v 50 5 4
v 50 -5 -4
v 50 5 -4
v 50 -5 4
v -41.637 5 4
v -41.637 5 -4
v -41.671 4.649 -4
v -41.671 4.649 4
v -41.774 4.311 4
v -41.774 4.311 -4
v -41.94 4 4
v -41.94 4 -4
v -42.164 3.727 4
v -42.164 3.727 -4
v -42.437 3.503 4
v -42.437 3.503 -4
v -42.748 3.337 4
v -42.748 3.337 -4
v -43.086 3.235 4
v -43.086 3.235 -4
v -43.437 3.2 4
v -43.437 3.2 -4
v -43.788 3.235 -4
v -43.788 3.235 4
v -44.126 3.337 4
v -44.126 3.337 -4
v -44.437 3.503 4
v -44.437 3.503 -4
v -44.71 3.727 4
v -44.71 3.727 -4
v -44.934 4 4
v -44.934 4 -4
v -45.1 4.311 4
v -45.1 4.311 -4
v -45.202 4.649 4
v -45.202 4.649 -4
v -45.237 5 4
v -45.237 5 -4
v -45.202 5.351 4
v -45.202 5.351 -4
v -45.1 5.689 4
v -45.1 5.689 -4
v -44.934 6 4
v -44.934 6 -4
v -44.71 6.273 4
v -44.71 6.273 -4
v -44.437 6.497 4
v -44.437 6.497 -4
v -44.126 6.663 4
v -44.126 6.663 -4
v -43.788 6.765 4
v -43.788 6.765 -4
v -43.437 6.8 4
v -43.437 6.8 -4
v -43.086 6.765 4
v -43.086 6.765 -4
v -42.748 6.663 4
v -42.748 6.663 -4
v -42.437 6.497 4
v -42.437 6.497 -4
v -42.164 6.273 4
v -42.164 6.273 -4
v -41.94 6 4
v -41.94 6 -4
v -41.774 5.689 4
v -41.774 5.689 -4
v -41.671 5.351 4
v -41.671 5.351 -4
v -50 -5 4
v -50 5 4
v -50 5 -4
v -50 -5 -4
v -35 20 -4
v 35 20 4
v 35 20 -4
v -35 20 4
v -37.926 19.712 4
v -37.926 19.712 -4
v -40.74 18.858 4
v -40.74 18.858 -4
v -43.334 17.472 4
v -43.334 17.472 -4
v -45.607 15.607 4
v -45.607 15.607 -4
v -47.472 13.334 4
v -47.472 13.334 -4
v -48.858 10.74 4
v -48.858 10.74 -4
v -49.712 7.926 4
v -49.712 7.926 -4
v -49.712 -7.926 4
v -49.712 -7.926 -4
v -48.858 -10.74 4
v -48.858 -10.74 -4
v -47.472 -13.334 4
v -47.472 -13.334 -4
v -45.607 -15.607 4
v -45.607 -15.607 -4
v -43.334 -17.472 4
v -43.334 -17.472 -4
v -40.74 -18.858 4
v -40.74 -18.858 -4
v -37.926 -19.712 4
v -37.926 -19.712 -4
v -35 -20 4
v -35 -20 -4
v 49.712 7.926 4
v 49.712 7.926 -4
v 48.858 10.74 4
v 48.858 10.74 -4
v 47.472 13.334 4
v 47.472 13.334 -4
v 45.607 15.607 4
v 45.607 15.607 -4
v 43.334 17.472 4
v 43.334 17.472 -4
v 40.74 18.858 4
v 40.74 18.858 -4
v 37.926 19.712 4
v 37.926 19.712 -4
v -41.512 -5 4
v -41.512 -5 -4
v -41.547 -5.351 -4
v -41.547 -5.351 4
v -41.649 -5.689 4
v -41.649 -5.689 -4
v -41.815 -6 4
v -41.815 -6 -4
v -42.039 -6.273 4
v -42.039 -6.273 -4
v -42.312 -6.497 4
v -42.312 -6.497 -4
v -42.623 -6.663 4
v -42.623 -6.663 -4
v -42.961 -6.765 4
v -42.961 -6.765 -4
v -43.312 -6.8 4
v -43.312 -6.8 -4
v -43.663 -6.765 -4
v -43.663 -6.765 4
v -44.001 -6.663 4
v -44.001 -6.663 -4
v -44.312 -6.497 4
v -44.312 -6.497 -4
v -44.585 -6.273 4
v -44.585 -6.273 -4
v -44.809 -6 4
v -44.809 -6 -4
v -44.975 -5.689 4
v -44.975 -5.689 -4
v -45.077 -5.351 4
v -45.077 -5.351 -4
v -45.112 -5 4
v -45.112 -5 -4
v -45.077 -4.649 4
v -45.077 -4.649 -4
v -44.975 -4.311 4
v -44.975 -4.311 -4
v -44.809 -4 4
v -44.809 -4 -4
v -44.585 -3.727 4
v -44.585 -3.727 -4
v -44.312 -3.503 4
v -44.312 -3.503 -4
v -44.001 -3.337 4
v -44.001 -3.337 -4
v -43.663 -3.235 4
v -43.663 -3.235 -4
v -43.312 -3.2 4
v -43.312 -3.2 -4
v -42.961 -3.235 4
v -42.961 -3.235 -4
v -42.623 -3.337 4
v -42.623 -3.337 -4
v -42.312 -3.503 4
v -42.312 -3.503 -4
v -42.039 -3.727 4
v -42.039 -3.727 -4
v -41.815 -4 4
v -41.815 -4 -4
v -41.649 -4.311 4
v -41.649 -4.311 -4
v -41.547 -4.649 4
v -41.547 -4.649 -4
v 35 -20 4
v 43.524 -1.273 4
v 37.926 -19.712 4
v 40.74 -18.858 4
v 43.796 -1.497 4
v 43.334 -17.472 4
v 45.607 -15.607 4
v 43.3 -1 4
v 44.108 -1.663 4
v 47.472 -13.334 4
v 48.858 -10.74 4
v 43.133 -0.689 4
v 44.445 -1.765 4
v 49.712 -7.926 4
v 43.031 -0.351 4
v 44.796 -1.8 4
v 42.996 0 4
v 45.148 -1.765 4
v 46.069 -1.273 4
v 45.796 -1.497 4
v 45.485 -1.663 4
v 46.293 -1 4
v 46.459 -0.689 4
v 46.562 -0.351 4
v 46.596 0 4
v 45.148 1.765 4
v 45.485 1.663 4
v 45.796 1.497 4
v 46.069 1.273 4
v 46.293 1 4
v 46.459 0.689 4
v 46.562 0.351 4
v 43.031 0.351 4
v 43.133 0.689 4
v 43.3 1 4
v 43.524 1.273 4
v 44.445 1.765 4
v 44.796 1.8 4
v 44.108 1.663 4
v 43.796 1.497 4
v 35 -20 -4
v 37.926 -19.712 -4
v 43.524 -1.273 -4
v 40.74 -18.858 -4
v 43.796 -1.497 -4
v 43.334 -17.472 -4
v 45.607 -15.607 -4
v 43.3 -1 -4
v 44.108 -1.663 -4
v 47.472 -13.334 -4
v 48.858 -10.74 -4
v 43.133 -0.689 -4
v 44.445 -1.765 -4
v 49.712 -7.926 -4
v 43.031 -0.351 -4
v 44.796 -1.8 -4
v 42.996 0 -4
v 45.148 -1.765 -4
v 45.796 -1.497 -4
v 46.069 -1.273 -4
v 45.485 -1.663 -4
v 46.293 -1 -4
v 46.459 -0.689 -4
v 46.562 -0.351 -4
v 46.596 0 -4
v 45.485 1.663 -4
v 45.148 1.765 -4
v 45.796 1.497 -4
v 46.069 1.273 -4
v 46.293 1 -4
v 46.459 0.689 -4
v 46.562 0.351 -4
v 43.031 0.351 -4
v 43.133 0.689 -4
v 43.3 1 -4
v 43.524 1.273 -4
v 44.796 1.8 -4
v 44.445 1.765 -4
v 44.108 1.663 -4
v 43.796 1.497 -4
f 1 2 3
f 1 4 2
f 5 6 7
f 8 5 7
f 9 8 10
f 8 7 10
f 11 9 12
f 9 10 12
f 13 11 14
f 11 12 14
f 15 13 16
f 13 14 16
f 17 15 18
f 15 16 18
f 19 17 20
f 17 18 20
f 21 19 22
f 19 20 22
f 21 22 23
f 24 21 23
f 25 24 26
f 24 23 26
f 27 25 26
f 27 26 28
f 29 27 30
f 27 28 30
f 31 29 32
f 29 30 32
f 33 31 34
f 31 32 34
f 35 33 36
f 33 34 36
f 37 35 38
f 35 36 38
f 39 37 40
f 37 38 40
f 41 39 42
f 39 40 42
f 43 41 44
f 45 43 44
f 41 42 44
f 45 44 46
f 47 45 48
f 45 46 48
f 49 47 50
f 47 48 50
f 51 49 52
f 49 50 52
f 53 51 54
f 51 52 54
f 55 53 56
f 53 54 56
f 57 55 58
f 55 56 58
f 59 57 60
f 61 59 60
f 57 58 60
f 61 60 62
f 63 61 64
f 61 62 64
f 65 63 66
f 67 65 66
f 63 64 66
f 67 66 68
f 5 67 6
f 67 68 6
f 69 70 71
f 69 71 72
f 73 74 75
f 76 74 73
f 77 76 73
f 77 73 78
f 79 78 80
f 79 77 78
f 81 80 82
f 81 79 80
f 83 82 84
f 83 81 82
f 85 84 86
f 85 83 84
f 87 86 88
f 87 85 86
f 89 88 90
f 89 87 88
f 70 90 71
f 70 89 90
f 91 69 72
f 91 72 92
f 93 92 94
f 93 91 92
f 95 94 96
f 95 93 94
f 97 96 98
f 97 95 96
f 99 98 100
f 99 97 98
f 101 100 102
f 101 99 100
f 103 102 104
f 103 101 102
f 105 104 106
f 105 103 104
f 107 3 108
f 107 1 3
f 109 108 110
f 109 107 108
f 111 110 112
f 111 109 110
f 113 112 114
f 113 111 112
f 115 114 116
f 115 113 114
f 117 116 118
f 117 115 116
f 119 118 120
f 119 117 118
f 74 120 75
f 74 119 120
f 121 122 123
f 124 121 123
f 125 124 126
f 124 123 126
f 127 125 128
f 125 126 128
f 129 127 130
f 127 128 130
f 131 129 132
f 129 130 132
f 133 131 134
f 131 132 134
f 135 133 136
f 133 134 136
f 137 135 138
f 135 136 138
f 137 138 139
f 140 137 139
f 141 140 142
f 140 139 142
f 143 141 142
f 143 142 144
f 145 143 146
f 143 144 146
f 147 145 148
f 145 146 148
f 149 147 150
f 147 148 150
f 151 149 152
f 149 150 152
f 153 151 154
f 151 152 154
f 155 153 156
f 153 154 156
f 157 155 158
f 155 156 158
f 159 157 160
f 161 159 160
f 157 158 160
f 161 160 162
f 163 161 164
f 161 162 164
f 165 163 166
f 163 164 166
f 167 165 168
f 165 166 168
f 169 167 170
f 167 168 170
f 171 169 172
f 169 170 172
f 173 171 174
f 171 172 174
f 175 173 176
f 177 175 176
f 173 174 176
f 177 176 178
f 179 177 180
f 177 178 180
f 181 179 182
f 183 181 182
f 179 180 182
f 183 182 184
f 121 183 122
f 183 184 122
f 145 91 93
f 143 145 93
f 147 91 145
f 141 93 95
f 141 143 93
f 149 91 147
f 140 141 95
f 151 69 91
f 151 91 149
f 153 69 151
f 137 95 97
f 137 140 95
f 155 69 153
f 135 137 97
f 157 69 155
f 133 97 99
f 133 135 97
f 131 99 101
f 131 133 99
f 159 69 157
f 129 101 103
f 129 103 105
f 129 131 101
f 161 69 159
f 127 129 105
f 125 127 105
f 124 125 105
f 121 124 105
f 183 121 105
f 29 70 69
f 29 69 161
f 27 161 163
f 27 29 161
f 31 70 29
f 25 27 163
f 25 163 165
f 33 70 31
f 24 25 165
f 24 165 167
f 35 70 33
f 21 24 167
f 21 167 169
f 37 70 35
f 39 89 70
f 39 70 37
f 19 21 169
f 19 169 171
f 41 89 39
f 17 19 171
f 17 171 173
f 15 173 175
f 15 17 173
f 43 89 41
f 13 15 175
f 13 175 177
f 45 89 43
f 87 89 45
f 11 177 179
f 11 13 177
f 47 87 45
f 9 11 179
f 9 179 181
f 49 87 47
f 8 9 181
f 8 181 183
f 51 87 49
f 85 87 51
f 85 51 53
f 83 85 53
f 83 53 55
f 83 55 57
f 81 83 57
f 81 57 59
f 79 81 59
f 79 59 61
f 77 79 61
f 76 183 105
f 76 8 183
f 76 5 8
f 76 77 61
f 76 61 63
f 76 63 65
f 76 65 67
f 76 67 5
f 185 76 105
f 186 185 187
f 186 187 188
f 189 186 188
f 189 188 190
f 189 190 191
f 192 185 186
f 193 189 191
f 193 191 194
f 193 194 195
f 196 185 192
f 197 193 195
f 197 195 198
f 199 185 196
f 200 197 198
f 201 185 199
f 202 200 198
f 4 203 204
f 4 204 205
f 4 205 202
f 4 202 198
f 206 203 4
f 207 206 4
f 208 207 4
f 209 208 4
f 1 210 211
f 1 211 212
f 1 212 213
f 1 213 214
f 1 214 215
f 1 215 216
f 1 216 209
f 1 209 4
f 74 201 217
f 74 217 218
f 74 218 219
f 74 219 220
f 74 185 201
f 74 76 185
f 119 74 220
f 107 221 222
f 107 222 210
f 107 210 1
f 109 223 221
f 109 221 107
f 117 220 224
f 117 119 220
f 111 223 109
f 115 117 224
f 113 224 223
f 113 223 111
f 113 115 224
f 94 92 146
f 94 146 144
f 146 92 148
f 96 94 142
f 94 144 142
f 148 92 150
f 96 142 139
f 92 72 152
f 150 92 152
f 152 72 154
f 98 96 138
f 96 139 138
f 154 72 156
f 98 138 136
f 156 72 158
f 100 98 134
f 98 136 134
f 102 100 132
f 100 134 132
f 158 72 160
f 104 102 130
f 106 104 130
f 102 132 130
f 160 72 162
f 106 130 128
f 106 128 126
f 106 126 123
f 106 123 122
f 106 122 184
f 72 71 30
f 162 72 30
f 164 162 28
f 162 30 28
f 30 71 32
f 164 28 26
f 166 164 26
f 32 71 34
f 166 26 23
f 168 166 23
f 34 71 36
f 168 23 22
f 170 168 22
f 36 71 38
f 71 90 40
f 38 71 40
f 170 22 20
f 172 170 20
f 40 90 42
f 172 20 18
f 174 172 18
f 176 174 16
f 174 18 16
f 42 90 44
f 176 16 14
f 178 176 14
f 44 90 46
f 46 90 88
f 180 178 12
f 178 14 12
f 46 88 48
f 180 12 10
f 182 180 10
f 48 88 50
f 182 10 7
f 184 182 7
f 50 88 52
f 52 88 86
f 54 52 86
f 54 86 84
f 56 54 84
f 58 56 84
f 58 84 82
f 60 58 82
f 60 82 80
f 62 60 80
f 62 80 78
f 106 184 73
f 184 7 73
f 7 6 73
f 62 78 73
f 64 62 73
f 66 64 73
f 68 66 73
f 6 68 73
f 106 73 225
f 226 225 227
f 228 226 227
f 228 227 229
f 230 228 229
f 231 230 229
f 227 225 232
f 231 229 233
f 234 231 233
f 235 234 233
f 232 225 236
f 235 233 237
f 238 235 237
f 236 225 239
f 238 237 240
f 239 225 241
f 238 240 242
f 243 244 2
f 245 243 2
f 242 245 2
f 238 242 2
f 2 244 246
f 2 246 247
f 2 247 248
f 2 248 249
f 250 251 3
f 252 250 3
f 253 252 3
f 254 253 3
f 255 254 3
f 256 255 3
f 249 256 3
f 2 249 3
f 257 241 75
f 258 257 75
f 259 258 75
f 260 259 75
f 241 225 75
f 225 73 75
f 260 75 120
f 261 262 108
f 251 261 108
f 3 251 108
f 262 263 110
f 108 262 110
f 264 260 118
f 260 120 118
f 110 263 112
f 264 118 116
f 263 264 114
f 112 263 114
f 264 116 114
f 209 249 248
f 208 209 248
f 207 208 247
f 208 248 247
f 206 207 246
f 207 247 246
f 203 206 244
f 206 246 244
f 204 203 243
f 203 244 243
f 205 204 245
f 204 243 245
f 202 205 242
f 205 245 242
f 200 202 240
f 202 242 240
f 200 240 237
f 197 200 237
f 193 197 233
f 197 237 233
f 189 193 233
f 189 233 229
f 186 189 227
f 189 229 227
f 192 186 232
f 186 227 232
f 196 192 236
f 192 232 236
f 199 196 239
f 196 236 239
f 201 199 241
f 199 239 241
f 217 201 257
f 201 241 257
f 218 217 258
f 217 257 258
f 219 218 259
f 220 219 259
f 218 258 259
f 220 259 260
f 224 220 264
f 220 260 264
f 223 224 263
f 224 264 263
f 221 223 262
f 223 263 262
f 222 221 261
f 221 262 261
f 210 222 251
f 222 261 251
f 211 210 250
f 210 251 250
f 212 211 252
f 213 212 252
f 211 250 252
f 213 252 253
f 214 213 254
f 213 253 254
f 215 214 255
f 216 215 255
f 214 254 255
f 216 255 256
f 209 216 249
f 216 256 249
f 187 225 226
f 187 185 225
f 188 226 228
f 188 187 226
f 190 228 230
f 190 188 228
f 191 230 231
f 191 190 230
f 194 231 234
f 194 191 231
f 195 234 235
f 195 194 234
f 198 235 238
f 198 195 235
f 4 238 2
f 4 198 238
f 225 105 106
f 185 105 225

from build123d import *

# Parameters (mm, degrees)
F1_DEPTH = 4
F2_R     = 1.8
F4_DEPTH = 8
F3_R     = 1.8
F5_DEPTH = 8


with BuildPart() as f1:
    # F0 (on Top) → F1 (new body, symmetric)
    with BuildSketch(Plane.XY):
        with BuildLine():
            ThreePointArc((50, 5), (45.606602, 15.606602), (35, 20))
            Line((35, 20), (-35, 20))
            ThreePointArc((-35, 20), (-45.606602, 15.606602), (-50, 5))
            Line((-50, 5), (-50, -5))
            ThreePointArc((-50, -5), (-45.606602, -15.606602), (-35, -20))
            Line((-35, -20), (35, -20))
            ThreePointArc((35, -20), (45.606602, -15.606602), (50, -5))
            Line((50, -5), (50, 5))
        make_face()
    extrude(amount=F1_DEPTH, both=True)

    # F2 (on face) → F4 (cut)
    with BuildSketch(Plane(origin=(0, 0, -4), x_dir=(1, 0, 0), z_dir=(0, 0, -1))):
        with Locations((-43.311954, 5)):
            Circle(F2_R)
        with Locations((-43.436911, -5)):
            Circle(F2_R)
    extrude(amount=-F4_DEPTH, mode=Mode.SUBTRACT)

    # F3 (on face) → F5 (cut)
    with BuildSketch(Plane(origin=(0, 0, -4), x_dir=(1, 0, 0), z_dir=(0, 0, -1))):
        with Locations((44.796437, 0)):
            Circle(F3_R)
    extrude(amount=-F5_DEPTH, mode=Mode.SUBTRACT)


solid = f1.part
